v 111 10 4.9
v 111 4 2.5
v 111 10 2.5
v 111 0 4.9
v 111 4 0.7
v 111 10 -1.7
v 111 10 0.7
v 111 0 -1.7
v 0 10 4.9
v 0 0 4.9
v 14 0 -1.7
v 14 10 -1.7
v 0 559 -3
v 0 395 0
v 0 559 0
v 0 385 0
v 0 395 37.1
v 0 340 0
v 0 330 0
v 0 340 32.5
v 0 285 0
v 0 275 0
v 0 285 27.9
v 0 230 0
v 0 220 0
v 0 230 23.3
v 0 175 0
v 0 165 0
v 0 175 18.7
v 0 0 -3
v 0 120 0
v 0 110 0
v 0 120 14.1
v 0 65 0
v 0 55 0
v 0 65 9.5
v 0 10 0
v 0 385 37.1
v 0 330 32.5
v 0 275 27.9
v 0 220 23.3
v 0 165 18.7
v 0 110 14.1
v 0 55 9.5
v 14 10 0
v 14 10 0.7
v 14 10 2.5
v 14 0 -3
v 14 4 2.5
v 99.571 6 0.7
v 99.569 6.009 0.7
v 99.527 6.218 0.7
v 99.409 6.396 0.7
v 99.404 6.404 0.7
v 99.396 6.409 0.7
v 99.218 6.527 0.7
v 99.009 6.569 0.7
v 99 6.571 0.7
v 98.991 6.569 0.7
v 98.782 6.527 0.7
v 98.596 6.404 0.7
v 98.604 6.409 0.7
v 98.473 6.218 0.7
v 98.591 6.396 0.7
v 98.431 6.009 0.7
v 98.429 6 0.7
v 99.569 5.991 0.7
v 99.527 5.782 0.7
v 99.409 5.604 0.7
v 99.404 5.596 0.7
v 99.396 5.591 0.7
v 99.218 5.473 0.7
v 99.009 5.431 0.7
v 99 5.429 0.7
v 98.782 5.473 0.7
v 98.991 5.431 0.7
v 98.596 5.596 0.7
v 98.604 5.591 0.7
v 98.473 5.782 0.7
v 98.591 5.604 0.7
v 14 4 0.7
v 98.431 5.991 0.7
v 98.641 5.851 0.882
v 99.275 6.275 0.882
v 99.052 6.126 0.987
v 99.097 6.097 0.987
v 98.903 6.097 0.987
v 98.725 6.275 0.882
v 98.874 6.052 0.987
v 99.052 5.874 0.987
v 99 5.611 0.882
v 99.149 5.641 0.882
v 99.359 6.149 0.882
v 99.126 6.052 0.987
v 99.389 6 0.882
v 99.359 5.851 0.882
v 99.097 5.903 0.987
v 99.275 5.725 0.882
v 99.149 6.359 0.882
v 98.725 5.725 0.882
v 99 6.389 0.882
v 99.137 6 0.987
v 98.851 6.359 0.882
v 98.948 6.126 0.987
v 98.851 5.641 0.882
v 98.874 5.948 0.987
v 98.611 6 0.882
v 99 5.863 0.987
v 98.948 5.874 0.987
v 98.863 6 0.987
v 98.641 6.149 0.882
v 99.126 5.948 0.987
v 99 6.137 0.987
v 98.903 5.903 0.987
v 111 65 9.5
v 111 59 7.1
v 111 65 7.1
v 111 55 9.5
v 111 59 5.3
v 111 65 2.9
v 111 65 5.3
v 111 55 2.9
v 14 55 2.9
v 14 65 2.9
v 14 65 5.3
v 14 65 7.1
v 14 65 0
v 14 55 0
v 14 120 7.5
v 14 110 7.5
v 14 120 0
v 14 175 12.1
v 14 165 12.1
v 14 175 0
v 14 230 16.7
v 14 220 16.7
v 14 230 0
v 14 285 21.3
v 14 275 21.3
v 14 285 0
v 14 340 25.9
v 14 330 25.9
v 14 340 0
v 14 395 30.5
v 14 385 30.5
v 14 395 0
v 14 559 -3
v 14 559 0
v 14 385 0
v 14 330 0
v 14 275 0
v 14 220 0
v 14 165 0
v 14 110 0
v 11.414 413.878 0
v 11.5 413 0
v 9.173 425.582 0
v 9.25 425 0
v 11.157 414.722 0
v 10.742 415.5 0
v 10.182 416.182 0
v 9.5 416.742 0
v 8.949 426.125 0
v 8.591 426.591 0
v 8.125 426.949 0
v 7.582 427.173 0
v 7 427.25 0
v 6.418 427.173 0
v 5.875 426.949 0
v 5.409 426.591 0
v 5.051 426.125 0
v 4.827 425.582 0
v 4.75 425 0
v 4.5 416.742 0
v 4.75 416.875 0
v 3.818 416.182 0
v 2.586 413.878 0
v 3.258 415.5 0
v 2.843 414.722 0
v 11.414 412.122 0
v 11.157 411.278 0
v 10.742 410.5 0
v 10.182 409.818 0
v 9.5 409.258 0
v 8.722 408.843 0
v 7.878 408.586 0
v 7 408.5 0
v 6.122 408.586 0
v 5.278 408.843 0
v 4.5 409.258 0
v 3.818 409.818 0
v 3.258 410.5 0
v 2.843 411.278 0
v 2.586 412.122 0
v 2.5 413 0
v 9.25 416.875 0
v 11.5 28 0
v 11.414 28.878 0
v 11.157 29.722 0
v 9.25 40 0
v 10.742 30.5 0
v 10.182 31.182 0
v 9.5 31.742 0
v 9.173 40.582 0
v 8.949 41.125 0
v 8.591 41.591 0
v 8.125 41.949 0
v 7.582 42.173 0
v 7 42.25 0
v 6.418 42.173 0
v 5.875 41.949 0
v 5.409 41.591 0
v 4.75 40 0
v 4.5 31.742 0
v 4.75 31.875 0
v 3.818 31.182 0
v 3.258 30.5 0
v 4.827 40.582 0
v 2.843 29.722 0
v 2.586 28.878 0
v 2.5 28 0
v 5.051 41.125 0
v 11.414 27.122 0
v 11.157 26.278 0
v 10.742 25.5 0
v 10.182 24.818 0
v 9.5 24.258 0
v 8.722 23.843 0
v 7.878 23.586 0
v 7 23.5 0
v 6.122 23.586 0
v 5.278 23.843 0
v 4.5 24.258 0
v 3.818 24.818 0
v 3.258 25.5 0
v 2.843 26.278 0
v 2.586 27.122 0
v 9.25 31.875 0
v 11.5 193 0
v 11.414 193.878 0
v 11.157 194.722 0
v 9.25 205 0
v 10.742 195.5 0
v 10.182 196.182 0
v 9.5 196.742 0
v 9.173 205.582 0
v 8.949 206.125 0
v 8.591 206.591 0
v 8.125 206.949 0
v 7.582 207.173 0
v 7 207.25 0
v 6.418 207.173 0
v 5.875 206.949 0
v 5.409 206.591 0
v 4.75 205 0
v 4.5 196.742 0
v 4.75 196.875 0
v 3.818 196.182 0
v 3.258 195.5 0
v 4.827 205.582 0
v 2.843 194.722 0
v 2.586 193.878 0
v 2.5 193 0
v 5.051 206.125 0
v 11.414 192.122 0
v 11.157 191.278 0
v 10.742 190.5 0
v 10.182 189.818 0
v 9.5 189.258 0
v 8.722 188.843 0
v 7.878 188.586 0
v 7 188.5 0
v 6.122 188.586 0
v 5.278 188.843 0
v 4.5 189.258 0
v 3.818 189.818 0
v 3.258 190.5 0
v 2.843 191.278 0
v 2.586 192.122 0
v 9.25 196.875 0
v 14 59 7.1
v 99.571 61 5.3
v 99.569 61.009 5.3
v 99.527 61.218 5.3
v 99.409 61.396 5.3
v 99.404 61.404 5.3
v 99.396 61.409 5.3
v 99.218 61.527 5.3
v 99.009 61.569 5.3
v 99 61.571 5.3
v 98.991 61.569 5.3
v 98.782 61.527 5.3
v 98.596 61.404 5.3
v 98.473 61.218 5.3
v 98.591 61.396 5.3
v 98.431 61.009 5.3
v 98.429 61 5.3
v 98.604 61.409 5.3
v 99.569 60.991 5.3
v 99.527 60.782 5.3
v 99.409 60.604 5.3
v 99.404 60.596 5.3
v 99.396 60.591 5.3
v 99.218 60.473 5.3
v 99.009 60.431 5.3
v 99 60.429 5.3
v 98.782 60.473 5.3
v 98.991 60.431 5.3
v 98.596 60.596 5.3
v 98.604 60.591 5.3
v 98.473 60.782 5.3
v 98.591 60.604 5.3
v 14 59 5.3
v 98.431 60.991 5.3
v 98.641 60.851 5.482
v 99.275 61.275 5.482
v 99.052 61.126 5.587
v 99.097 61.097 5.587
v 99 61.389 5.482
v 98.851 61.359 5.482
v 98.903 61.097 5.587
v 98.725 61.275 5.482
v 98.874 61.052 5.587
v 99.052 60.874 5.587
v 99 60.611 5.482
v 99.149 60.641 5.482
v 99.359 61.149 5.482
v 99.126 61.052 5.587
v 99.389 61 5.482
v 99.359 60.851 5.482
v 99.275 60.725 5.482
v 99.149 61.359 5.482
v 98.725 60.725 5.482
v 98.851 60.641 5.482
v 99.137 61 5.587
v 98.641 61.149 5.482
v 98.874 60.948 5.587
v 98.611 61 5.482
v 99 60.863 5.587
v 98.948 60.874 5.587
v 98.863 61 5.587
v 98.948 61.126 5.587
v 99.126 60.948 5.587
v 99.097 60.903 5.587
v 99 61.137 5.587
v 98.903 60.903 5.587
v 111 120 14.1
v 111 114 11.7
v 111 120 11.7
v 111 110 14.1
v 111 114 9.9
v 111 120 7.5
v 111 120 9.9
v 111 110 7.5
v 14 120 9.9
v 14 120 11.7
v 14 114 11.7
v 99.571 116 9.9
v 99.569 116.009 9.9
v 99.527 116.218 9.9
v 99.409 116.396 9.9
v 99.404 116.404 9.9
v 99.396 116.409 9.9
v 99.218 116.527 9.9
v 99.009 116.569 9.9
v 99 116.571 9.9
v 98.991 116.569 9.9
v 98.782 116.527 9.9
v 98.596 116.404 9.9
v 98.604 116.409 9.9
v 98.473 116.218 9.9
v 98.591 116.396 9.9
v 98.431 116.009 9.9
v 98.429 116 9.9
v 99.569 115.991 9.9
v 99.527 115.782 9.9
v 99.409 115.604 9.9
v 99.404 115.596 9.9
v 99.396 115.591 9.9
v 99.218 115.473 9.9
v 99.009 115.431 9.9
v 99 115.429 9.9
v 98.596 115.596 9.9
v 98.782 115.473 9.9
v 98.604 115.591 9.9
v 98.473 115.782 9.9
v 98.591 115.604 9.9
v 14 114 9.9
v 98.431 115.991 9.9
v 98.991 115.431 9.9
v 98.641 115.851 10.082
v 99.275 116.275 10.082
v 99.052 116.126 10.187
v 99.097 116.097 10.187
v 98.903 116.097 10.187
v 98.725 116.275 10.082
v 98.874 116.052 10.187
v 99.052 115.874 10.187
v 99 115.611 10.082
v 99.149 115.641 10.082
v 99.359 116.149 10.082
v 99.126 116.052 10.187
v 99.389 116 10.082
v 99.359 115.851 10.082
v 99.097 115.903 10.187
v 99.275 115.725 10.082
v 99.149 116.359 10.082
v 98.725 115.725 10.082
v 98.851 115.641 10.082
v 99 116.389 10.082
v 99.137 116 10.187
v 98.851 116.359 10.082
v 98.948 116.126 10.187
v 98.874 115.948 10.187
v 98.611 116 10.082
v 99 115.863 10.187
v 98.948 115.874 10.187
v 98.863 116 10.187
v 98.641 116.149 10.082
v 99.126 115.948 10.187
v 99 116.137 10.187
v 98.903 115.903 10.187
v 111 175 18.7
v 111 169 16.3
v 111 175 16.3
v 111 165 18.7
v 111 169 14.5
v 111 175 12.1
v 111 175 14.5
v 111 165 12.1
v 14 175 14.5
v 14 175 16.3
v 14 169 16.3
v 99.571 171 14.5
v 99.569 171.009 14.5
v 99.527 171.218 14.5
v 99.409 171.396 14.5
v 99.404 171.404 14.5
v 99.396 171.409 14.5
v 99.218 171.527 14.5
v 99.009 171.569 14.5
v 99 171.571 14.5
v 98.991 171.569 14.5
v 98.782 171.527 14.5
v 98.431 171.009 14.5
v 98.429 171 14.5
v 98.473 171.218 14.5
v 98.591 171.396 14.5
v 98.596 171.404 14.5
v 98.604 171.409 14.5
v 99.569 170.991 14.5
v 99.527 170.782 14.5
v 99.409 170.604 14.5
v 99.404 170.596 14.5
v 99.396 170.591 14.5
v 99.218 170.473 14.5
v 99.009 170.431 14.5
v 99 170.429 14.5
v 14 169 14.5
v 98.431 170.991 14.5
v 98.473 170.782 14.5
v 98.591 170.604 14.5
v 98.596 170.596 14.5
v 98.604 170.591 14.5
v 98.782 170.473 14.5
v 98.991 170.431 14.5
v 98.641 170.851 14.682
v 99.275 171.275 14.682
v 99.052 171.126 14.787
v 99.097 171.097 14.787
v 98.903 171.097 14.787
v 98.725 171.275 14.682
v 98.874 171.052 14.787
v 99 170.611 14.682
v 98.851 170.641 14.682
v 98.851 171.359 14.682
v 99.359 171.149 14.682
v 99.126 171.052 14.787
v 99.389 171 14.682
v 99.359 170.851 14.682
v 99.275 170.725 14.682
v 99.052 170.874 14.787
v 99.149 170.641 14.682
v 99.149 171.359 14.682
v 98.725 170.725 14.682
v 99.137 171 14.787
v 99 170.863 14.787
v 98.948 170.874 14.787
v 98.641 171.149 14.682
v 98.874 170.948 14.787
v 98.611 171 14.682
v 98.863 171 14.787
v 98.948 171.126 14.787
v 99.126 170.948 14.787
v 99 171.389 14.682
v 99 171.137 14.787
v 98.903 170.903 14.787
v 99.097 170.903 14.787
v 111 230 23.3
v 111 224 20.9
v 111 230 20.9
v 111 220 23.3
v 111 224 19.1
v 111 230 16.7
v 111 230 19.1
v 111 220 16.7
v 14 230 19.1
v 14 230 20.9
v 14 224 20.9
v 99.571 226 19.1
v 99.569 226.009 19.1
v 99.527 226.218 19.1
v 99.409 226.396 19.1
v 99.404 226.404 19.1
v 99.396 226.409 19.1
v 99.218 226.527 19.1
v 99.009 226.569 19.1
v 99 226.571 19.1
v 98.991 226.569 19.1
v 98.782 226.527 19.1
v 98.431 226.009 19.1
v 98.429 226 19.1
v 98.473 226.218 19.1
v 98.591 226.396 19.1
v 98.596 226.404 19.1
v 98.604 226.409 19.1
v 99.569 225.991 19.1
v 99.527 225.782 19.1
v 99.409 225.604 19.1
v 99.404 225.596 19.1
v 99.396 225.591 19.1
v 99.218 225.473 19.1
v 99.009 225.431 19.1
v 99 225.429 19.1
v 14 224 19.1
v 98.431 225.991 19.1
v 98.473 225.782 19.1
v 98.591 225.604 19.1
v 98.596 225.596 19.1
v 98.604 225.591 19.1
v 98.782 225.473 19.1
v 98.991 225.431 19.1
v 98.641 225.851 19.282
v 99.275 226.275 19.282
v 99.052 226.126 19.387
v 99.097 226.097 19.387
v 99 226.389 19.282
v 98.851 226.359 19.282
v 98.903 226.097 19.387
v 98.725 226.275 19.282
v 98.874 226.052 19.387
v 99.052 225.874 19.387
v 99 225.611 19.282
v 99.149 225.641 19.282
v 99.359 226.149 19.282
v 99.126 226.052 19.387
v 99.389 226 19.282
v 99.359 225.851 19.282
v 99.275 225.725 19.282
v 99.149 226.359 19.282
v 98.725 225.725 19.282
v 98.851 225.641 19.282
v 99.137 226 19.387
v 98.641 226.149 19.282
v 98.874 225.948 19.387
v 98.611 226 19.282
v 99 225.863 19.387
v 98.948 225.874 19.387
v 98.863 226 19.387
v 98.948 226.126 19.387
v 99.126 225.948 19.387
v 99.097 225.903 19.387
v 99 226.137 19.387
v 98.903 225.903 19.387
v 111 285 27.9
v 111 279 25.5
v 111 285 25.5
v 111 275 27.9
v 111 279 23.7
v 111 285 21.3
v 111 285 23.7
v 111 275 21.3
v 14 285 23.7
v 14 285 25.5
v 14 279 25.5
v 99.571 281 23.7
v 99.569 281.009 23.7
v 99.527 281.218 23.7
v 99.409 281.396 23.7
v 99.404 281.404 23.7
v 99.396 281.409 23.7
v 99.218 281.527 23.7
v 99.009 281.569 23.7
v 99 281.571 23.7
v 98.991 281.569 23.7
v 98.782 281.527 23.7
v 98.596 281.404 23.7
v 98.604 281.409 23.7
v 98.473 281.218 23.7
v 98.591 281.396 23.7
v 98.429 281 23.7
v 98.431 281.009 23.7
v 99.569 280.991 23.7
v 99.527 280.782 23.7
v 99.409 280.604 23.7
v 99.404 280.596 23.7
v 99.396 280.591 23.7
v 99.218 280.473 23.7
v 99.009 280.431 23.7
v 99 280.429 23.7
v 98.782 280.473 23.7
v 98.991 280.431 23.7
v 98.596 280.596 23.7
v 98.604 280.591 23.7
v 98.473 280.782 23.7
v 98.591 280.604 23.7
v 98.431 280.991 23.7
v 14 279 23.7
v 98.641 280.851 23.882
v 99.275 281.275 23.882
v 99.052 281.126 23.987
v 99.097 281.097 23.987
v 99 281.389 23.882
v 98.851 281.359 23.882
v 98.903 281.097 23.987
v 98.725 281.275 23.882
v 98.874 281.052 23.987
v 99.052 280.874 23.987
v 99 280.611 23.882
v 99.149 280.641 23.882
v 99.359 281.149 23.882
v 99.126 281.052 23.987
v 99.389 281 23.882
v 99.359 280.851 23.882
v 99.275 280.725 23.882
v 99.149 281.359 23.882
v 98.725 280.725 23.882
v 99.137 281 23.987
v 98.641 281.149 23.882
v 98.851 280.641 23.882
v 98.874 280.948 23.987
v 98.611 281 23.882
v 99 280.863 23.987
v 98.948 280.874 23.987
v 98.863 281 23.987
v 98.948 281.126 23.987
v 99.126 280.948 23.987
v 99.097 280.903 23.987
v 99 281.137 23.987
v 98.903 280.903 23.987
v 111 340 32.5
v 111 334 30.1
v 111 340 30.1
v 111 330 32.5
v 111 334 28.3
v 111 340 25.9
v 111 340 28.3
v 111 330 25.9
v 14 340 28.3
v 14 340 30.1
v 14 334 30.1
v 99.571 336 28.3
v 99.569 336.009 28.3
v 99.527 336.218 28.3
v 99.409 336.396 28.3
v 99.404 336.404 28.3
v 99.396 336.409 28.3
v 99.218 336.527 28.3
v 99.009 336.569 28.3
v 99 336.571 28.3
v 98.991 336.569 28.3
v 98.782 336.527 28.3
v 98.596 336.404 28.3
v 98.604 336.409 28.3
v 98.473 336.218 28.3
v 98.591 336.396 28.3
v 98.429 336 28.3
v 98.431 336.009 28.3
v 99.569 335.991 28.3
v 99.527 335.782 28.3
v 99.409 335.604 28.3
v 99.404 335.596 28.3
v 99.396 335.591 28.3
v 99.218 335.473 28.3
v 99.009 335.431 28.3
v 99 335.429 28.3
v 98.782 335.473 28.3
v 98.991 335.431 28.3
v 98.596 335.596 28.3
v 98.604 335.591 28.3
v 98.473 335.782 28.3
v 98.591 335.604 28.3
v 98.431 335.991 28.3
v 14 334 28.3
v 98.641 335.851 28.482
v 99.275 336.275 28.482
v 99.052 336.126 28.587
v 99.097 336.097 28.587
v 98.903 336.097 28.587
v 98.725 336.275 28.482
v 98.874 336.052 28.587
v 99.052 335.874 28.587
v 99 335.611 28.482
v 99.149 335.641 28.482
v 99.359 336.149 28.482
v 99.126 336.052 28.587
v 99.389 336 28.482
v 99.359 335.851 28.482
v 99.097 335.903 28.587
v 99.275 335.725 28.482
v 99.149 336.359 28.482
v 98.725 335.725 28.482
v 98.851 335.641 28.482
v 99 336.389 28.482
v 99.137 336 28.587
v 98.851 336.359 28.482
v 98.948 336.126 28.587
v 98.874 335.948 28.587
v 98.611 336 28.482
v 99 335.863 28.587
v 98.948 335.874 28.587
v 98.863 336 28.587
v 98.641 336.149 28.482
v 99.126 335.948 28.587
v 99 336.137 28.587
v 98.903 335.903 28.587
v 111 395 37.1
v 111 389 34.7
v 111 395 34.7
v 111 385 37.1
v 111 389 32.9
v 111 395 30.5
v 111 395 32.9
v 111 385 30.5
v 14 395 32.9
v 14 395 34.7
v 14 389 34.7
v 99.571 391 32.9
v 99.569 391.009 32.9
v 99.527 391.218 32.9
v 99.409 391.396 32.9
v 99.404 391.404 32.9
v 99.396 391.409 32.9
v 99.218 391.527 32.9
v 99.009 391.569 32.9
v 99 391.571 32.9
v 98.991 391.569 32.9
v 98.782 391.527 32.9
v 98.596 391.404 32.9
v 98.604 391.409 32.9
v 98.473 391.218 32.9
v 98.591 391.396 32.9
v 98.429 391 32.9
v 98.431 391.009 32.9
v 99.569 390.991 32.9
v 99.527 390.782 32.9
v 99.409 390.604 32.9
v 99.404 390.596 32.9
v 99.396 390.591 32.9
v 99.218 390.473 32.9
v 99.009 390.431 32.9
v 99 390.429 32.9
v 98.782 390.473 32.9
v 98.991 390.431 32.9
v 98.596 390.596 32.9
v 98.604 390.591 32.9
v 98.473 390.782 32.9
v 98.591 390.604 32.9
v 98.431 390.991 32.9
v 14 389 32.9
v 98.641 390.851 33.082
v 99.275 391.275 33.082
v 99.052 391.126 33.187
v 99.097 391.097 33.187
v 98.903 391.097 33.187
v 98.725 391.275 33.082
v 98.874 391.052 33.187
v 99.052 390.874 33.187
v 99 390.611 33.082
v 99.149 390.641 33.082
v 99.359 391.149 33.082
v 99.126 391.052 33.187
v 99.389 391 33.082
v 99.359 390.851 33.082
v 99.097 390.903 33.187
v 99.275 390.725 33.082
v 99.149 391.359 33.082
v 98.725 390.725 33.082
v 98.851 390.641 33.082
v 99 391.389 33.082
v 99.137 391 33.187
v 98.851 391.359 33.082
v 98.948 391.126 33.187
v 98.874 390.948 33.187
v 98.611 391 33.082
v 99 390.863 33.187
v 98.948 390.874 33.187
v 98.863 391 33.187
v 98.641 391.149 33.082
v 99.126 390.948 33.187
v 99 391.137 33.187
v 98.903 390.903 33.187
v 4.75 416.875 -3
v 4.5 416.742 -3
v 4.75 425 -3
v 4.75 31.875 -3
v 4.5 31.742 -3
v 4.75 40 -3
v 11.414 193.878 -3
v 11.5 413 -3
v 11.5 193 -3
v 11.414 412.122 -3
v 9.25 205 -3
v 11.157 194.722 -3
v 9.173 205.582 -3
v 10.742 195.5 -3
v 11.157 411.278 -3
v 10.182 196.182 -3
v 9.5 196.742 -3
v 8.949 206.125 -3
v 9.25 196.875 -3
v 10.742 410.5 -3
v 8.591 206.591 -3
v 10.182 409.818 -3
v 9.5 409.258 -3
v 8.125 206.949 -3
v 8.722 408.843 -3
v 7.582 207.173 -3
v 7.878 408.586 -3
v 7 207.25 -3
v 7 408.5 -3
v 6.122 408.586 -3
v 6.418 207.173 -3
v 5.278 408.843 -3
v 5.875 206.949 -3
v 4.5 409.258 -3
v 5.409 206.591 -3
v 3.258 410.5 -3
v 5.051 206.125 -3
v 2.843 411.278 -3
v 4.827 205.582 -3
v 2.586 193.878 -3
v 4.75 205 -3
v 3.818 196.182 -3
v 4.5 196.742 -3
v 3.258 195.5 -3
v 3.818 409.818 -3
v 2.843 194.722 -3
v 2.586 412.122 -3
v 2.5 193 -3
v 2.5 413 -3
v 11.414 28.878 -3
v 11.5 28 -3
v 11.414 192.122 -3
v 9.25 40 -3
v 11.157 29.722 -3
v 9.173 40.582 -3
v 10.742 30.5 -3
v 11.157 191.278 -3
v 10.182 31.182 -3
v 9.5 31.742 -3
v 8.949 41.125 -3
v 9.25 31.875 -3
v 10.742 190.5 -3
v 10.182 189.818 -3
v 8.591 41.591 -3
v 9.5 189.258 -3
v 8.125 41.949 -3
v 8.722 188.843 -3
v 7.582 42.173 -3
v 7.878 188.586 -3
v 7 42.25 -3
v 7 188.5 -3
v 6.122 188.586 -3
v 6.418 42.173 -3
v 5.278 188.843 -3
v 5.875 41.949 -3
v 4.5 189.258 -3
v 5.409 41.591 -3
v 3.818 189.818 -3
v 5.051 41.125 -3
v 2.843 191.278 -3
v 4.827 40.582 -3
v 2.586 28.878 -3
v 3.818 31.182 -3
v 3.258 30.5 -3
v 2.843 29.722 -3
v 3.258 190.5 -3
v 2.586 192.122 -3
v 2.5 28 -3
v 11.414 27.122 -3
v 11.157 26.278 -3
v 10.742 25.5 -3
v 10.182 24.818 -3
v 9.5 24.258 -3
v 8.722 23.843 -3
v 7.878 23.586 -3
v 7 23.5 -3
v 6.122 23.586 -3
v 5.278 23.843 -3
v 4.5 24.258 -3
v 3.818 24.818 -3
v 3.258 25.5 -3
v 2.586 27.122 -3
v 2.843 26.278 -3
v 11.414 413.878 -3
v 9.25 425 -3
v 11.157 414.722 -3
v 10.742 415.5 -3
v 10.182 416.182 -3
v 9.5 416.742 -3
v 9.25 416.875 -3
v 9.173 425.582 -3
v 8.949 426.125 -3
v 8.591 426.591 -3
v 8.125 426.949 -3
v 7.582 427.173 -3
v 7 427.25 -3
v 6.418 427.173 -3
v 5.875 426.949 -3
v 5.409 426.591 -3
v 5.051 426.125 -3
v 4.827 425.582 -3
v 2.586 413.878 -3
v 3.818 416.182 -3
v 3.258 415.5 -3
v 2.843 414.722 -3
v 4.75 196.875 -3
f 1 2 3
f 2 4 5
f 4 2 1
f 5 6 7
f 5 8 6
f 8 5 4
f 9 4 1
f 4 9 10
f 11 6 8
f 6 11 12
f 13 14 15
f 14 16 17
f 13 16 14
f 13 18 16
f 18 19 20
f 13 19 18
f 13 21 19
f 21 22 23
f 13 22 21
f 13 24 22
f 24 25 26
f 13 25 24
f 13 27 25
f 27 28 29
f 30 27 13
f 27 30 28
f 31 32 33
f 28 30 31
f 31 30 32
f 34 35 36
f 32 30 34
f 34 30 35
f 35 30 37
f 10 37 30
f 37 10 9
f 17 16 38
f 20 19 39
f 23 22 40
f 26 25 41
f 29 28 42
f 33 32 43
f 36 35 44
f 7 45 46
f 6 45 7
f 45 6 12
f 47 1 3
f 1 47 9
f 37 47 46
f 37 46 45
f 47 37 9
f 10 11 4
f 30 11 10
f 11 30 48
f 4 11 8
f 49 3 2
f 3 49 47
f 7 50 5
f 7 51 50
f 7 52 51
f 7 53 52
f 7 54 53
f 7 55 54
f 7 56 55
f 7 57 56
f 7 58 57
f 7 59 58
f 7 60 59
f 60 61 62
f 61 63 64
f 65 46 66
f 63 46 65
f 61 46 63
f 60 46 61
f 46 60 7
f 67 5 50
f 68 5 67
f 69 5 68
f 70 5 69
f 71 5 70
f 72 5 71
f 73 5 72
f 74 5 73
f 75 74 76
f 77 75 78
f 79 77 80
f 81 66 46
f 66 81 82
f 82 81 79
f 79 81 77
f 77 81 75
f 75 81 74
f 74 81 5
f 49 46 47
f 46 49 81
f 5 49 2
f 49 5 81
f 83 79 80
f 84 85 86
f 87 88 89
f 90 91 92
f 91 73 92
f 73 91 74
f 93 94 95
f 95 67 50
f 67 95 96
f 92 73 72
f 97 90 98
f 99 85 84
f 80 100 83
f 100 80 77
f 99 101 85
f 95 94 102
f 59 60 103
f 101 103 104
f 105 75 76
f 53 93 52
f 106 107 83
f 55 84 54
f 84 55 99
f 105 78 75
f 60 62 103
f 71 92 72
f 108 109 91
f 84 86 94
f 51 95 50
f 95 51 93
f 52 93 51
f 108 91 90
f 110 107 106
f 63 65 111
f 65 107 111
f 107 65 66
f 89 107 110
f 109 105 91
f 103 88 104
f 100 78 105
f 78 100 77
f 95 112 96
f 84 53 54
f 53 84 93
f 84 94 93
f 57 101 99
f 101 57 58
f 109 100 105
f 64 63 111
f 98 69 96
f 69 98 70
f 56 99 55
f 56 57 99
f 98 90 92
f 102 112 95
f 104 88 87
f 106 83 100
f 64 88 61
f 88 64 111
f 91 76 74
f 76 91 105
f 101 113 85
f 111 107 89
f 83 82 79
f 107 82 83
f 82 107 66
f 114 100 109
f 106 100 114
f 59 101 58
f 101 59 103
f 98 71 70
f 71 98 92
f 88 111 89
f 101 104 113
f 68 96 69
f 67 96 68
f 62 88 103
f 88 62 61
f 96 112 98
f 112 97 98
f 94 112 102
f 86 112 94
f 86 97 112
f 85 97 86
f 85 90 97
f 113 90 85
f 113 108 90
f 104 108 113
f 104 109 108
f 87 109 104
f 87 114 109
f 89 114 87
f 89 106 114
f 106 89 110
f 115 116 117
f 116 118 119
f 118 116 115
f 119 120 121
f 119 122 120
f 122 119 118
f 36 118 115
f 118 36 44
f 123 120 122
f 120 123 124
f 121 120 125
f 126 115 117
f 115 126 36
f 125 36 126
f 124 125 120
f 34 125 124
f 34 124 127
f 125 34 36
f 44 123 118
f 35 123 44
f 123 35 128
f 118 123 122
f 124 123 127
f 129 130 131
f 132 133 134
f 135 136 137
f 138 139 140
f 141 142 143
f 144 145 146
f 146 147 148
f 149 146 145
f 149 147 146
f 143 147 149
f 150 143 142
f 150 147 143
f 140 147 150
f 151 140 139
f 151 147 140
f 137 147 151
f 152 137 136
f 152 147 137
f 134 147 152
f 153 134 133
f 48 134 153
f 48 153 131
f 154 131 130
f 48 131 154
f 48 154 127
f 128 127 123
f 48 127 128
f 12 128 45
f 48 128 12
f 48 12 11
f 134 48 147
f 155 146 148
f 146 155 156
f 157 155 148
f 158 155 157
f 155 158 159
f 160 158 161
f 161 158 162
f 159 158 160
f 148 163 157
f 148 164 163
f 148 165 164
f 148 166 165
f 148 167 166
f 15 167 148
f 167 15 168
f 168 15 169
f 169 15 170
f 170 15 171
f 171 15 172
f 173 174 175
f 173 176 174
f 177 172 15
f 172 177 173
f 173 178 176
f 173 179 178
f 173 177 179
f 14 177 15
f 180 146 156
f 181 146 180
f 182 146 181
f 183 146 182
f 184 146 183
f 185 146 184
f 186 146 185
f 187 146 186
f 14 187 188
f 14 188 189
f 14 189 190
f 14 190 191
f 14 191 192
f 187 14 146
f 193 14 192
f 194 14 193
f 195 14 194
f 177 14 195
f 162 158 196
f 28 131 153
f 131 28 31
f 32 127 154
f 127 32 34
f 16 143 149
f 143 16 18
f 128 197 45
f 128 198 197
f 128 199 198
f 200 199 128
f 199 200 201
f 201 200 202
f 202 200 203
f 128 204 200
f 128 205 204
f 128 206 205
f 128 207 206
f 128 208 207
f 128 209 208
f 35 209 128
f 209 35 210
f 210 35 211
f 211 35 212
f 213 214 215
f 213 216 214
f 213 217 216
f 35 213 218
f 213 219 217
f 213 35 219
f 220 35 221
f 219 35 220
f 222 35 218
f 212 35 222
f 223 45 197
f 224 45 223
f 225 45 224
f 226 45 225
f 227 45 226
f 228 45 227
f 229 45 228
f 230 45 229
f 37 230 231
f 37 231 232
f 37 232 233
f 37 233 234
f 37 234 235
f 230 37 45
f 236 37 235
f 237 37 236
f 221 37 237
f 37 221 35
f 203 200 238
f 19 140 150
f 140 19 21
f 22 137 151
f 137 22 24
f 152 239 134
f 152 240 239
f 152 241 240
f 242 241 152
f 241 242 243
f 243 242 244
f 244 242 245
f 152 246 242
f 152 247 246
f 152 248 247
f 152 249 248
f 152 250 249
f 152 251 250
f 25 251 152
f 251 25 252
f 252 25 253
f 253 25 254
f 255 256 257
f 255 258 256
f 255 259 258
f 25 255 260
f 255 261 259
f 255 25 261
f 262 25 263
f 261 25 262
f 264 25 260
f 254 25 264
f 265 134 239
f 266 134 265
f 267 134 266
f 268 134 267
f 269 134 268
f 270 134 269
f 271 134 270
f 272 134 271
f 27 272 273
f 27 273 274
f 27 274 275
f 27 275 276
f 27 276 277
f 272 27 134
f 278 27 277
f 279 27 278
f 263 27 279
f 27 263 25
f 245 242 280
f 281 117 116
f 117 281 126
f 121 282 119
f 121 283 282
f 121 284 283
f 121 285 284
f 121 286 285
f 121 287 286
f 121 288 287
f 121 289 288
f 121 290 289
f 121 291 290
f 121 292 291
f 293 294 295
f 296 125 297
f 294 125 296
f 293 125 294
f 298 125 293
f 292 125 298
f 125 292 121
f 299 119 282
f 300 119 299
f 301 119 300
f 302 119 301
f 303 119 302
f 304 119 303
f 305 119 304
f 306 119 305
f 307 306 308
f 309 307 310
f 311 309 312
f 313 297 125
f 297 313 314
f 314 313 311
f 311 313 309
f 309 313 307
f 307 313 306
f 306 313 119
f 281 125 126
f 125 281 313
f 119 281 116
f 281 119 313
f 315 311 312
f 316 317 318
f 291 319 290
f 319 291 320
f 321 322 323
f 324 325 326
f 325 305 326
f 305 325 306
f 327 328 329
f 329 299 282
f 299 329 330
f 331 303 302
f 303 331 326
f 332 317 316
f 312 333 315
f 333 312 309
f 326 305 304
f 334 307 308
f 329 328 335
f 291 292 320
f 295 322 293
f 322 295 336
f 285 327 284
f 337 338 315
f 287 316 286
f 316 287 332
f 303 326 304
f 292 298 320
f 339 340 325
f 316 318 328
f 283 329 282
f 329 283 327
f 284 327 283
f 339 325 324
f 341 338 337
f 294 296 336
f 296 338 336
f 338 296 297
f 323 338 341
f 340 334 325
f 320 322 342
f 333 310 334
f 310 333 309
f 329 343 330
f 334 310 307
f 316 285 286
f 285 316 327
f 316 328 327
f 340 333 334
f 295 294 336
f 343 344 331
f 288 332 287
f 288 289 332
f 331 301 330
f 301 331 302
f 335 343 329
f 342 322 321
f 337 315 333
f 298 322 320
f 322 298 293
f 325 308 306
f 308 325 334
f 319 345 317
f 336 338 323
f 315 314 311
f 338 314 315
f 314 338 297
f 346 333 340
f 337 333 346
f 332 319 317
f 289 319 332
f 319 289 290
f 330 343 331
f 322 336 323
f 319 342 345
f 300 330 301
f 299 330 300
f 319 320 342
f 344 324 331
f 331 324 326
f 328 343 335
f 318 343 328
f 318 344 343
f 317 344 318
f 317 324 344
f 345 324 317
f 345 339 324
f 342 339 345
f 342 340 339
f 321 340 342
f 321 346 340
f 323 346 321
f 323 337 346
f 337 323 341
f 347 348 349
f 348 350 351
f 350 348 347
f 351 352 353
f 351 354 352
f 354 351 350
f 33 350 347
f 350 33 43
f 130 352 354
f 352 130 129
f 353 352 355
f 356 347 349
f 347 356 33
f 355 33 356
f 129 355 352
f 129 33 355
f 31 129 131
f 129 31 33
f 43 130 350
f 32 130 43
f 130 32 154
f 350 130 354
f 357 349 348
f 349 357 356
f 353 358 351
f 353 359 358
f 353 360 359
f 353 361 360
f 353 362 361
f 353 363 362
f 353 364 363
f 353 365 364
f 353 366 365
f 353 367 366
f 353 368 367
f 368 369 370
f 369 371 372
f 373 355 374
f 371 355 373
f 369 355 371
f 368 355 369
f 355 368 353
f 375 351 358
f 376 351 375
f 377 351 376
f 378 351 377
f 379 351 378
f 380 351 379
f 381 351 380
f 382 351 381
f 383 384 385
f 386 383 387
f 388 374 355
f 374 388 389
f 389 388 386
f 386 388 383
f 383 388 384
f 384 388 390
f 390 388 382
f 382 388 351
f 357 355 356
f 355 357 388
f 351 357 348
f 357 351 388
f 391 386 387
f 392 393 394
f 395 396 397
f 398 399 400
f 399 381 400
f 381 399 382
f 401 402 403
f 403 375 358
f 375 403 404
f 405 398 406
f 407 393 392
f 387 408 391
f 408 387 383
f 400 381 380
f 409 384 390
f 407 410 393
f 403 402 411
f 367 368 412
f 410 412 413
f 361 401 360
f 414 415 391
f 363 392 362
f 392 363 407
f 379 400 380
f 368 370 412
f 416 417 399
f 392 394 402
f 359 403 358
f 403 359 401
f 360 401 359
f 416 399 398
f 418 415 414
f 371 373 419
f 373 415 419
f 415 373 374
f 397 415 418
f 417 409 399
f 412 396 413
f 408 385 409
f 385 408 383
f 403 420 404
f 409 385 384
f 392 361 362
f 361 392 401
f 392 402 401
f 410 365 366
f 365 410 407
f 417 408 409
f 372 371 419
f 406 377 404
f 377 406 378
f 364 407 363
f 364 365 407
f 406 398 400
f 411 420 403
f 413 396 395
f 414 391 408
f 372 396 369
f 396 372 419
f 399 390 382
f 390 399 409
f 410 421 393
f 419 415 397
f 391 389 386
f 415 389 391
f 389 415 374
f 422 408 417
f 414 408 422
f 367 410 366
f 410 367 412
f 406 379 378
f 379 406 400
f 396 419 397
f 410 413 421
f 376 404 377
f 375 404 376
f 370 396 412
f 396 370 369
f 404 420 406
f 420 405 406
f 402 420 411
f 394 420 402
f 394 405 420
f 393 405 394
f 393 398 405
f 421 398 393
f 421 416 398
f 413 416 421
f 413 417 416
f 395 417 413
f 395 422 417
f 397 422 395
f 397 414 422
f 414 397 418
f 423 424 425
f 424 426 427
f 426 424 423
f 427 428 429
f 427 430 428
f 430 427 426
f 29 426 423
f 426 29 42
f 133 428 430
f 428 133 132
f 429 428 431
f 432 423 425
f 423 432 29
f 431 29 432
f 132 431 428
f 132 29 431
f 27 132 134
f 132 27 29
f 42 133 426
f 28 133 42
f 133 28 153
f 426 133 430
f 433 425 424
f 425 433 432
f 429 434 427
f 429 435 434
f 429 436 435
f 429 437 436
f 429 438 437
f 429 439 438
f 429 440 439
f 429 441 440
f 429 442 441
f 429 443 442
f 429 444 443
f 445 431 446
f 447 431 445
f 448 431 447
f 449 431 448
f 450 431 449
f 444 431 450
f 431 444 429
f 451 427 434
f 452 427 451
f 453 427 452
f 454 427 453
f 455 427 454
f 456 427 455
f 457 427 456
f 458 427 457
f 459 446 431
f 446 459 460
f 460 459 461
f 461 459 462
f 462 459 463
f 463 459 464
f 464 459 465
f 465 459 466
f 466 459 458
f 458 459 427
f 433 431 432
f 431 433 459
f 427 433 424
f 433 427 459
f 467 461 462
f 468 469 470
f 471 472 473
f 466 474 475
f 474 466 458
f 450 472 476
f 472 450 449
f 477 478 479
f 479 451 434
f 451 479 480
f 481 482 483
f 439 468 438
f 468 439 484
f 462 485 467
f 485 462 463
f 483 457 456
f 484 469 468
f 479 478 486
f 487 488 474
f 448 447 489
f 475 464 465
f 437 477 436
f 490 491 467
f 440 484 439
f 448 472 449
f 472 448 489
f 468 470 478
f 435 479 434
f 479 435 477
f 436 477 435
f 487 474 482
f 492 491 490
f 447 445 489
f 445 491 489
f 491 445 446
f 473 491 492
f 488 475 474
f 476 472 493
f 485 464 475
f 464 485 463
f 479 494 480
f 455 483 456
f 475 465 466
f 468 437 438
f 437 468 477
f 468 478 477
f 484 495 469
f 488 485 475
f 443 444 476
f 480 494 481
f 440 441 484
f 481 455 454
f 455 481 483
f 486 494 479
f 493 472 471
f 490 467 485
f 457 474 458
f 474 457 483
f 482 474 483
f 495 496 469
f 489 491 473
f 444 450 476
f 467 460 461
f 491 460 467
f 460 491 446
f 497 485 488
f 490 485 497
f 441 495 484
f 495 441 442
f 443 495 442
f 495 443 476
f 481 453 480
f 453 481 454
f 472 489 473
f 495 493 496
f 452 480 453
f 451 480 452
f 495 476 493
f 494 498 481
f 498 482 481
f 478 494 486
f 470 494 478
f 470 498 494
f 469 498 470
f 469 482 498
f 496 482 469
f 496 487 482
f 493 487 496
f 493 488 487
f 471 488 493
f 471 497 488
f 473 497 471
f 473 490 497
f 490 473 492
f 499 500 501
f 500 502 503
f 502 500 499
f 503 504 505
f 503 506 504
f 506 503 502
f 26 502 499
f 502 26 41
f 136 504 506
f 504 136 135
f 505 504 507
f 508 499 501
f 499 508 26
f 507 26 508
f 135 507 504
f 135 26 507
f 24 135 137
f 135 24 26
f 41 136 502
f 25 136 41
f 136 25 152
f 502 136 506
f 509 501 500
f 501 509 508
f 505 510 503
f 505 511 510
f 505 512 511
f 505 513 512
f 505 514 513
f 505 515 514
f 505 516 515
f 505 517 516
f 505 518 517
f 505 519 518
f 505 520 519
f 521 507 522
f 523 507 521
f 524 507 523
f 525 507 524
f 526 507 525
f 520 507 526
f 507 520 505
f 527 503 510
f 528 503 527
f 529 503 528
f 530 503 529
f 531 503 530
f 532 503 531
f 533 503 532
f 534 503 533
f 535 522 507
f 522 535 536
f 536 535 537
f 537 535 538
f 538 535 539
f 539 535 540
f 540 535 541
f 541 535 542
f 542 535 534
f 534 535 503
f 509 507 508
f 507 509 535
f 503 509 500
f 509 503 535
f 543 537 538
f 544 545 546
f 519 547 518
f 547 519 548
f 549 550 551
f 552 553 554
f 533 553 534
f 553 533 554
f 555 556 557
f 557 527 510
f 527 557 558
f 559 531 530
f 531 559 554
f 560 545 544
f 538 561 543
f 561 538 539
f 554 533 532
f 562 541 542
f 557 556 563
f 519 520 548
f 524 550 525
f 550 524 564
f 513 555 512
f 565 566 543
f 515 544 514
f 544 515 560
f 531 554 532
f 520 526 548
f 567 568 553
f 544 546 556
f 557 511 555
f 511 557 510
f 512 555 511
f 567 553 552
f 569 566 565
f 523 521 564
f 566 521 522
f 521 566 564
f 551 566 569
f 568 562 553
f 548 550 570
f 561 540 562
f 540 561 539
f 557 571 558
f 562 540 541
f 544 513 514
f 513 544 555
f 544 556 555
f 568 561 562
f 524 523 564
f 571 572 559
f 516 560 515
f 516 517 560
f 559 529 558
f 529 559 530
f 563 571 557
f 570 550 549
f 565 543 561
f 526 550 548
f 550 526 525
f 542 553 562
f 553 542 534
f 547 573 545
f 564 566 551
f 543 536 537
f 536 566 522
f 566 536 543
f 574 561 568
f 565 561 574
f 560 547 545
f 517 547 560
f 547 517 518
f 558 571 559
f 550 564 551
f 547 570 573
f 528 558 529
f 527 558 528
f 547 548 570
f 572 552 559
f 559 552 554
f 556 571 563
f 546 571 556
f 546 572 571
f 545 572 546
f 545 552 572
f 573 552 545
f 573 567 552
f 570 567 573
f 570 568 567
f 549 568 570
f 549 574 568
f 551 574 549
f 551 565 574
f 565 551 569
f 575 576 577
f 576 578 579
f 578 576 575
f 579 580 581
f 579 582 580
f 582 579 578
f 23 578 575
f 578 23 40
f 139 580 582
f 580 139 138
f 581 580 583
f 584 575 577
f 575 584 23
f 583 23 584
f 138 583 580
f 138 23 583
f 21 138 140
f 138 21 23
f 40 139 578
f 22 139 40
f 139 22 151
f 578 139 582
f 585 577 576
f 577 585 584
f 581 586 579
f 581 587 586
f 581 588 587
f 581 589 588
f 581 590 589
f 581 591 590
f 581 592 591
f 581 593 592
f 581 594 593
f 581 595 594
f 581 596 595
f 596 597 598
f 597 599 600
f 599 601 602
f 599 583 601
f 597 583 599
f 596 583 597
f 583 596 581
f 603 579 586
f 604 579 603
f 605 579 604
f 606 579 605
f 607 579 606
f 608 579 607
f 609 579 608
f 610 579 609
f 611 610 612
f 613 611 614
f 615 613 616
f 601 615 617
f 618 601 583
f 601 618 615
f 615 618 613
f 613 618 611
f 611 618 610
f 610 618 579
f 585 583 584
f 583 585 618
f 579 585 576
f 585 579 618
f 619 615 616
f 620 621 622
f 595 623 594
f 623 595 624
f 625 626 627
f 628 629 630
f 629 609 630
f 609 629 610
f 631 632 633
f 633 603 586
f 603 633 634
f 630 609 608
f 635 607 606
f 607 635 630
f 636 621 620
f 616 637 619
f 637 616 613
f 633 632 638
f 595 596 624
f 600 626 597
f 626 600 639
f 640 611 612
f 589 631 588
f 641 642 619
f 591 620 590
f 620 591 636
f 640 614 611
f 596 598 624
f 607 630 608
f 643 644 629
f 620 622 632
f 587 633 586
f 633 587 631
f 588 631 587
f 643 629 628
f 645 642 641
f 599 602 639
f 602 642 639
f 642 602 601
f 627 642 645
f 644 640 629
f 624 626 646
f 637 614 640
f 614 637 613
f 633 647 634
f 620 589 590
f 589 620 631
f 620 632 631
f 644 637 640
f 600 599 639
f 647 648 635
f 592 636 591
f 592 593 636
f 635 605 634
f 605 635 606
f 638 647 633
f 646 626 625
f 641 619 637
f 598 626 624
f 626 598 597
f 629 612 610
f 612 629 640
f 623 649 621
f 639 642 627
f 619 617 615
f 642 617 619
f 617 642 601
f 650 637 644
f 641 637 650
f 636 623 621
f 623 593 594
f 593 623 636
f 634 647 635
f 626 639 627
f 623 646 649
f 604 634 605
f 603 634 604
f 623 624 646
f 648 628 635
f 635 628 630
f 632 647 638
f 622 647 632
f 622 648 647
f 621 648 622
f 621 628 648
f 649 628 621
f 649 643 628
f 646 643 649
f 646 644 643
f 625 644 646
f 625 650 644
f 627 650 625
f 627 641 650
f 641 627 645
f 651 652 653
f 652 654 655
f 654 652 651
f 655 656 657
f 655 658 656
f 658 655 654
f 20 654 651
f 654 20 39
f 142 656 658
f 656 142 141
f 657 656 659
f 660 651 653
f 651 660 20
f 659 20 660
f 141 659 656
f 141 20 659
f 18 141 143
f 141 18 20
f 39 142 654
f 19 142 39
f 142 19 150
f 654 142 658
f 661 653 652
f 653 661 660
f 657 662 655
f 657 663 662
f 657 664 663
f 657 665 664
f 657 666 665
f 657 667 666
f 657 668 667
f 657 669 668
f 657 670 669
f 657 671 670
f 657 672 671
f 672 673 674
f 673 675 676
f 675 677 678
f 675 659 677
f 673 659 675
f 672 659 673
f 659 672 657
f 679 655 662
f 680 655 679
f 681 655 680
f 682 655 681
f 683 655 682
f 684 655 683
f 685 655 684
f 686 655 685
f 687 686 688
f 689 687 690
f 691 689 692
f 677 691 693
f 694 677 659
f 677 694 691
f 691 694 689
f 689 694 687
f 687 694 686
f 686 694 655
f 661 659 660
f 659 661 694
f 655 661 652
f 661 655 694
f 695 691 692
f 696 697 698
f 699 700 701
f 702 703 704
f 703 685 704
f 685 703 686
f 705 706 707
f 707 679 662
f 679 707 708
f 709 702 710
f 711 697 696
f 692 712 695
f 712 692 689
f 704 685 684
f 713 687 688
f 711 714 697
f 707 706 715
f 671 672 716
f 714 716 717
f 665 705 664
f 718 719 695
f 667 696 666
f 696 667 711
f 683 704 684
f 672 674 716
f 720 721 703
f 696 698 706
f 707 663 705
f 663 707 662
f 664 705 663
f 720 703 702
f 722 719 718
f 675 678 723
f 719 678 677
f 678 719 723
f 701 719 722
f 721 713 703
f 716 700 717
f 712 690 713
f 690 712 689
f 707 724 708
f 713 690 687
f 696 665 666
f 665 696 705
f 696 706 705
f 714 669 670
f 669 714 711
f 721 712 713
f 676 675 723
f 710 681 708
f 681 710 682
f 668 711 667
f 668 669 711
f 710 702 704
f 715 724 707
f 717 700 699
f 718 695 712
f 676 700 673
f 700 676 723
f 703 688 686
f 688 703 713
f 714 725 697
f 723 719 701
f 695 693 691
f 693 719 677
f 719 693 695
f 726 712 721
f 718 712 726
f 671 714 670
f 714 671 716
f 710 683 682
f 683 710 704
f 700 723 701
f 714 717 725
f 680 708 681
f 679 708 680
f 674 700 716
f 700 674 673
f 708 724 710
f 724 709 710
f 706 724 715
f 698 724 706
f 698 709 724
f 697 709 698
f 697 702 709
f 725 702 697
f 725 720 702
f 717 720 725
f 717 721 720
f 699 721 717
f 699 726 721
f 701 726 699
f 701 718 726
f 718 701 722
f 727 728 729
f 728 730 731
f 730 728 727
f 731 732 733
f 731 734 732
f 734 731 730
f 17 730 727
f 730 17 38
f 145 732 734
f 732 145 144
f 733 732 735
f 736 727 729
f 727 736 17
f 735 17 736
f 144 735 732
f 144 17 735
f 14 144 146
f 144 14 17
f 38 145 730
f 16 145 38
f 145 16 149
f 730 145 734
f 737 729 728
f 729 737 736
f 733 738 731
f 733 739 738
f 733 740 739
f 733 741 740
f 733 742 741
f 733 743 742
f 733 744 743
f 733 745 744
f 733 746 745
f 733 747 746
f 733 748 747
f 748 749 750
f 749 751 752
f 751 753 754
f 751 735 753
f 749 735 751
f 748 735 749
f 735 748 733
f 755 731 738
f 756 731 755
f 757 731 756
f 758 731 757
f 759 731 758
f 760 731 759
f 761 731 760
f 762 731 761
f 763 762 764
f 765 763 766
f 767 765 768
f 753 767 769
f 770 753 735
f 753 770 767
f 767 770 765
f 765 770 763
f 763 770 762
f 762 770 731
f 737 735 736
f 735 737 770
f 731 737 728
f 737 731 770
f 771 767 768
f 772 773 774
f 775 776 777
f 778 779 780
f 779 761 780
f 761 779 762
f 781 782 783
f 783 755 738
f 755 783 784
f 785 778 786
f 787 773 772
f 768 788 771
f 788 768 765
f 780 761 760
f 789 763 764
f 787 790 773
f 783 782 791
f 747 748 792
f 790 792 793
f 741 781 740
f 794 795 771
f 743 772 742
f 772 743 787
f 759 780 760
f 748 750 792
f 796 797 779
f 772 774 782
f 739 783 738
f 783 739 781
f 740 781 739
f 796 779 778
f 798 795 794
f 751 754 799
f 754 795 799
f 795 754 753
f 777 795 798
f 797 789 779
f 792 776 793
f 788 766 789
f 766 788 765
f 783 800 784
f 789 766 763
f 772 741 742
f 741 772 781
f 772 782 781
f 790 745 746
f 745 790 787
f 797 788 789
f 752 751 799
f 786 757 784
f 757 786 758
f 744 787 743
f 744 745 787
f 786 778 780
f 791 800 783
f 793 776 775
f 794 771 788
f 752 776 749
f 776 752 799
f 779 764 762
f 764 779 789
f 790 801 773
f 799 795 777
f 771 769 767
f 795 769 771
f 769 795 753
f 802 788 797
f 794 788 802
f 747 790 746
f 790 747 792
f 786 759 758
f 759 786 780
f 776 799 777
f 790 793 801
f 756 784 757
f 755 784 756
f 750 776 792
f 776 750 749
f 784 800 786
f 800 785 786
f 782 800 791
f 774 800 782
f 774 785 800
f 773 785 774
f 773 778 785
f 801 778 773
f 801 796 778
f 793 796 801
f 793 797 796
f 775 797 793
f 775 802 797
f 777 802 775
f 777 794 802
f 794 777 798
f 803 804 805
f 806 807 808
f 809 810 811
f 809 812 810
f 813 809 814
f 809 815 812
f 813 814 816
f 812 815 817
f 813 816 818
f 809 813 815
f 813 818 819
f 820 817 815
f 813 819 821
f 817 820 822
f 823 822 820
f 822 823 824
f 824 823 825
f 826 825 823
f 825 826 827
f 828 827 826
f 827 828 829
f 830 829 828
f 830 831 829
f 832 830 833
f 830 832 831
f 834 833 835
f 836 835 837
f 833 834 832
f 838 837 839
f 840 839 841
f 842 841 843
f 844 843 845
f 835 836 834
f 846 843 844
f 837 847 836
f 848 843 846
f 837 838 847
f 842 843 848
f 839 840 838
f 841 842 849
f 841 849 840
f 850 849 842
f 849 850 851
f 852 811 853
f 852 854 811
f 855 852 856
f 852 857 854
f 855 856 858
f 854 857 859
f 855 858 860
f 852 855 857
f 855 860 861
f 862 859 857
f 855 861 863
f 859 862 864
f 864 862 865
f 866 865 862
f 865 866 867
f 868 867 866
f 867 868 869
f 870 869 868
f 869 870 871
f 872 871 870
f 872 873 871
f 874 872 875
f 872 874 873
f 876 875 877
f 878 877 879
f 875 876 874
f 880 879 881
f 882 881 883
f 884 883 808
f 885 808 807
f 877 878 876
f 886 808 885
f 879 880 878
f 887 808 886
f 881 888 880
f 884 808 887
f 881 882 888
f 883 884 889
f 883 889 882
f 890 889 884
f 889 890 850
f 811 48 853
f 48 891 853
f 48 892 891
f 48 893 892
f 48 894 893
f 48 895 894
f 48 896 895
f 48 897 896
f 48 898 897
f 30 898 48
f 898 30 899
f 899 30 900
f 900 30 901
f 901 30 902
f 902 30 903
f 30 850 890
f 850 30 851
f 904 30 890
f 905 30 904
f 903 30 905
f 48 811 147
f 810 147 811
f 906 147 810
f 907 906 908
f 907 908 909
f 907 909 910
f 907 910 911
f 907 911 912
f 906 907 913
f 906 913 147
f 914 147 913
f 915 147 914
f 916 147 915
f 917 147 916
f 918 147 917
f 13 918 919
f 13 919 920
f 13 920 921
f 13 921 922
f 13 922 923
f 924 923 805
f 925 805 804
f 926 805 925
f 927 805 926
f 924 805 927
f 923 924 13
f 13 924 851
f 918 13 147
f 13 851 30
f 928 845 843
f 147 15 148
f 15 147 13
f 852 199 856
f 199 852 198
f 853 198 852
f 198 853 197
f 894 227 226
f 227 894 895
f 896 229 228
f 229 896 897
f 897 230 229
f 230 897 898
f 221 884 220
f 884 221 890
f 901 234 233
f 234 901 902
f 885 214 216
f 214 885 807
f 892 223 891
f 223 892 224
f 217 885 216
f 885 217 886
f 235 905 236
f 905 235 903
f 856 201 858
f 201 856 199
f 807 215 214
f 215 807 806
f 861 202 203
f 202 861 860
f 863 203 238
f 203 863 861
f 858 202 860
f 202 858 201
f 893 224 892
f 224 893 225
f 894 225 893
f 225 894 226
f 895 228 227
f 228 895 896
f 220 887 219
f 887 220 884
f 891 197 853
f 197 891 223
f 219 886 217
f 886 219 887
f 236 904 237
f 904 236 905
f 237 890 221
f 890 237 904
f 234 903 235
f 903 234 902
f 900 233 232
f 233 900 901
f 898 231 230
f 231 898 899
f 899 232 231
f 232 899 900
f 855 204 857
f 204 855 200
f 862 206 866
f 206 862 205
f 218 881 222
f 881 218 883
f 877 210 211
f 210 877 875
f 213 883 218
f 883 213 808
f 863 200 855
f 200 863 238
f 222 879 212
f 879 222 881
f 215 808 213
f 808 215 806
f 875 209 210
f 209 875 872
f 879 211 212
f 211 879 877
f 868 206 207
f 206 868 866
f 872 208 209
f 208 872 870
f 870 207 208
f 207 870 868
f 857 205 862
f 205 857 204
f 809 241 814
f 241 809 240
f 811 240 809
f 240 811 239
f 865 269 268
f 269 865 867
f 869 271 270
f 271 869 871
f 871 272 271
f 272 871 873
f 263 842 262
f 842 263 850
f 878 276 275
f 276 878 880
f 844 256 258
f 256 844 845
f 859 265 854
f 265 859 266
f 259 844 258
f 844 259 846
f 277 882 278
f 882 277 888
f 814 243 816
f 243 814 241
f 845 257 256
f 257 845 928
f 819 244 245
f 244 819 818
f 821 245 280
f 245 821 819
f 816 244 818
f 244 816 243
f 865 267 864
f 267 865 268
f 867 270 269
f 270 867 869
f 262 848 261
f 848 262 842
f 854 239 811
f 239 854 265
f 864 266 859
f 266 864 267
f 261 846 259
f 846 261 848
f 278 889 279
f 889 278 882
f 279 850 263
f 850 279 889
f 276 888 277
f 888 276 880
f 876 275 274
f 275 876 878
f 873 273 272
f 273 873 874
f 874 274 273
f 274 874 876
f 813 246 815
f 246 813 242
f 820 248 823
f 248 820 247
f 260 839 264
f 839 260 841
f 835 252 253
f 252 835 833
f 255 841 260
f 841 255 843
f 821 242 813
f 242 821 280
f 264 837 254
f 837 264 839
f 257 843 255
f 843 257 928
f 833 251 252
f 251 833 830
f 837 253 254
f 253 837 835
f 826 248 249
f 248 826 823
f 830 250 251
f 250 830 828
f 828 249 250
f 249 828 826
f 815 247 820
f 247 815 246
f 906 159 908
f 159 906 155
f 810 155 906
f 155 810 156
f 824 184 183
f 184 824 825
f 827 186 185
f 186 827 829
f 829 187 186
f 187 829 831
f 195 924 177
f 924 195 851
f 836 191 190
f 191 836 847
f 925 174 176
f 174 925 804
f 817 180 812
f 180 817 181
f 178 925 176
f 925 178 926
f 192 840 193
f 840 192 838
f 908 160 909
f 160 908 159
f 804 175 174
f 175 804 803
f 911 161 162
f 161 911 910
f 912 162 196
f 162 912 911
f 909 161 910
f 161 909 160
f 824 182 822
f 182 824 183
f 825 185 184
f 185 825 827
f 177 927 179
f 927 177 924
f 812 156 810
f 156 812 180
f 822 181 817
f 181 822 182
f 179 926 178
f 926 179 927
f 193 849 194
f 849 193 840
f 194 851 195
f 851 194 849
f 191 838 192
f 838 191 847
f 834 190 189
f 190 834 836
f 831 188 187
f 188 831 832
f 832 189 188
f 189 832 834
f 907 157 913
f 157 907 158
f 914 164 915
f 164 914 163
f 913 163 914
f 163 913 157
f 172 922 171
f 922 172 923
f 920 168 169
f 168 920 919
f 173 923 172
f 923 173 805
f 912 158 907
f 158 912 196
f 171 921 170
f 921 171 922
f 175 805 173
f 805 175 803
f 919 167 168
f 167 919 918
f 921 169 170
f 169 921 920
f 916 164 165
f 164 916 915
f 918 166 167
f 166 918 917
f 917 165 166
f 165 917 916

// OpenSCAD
// Side-Slide Shingle Rack - parametric wall display for carded die-cast cars.
// Units: mm. x = left->right, y = up, z = out from the wall.
//
// Every card stands in its own depth plane (shingled, 'step' apart) and is held
// only by a gutter in its own ledge. Nothing is in front of the cards, and each
// card slides out to the right without touching any other card.
//
// NOTE: not test-rendered in this environment (no OpenSCAD available) - open it
// in OpenSCAD, press F6, and check the echoed numbers before printing.
// MEASURE YOUR CARDS with calipers and edit the first block.

// ---- card (measure these) ----
card_w      = 105;   // card width
card_h      = 165;   // card height
card_t      = 1.2;   // card thickness (cardstock only, excluding blister)
blister_h   = 42;    // height of the car blister measured from card bottom edge
                     // (must fit in the visible window, see assert below)

// ---- layout ----
N           = 8;     // number of cards
pitch       = 55;    // vertical spacing = visible strip per card
step        = 4.6;   // depth spacing between neighbouring cards

// ---- structure ----
back_t      = 3;     // wall plate thickness
spine_w     = 14;    // left spine / end stop width
ledge_h     = 10;    // ledge height (y)
gutter_d    = 6;     // how deep the card bottom sits in the gutter
slop        = 0.3;   // clearance each side of the card in the gutter
rear_wall   = 2.4;   // ledge wall behind the gutter
front_wall  = 2.4;   // ledge wall in front of the gutter
thumb_out   = 8;     // card overhangs the ledge's right end by this much

gw          = card_t + 2*slop;              // gutter width
ledge_w     = spine_w + card_w - thumb_out; // ledge length (x)
H           = (N-1)*pitch + ledge_h - gutter_d + card_h + 5;  // plate height

// z of the rear face of card j (j = 0 is the bottom, rearmost card)
function zc(j) = 1 + j*step;

// ---- sanity checks ----
// ledge j must clear the card behind it (card j-1 passes behind ledge j)
assert(step >= rear_wall + slop + card_t + 0.4, "step too small: ledge rear wall hits the card behind it");
// the blister of card j must fit under ledge j+1
assert(ledge_h - gutter_d + blister_h <= pitch, "blister too tall: it would hit the ledge above; increase pitch");
echo(str("Rack: ", spine_w+card_w, " x ", H, " x ", zc(N-1)+gw+front_wall+back_t, " mm"));

module ledge(j) {
    z0 = zc(j) - slop - rear_wall;           // rear face of the ledge
    z1 = zc(j) + card_t + slop + front_wall; // front face of the ledge
    y0 = j*pitch;
    difference() {
        union() {
            // ledge beam
            translate([0, y0, z0]) cube([ledge_w, ledge_h, z1 - z0]);
            // bridge from ledge back to the wall plate (spine only)
            translate([0, y0, 0]) cube([spine_w, ledge_h, z1]);
        }
        // gutter open to the right, closed by the spine on the left
        translate([spine_w, y0 + ledge_h - gutter_d, zc(j) - slop])
            cube([ledge_w, gutter_d + 1, gw]);
    }
    // tiny detent bump so cards don't creep out
    translate([spine_w + card_w - thumb_out - 12, y0 + ledge_h - gutter_d + 2, zc(j) - slop - 0.4])
        sphere(r = 0.7, $fn = 16);
}

module keyhole(y) {
    translate([spine_w/2, y, -back_t - 1]) {
        cylinder(d = 9,   h = back_t + 2, $fn = 32);
        translate([0, 0, 0]) hull() {
            cylinder(d = 4.5, h = back_t + 2, $fn = 24);
            translate([0, 12, 0]) cylinder(d = 4.5, h = back_t + 2, $fn = 24);
        }
    }
}

module rack() {
    difference() {
        union() {
            translate([0, 0, -back_t]) cube([spine_w, H, back_t]);   // wall plate
            for (j = [0 : N-1]) ledge(j);
        }
        keyhole(ledge_h + 18);
        keyhole((N/2 - 1)*pitch + ledge_h + 18);
        keyhole((N-1)*pitch + ledge_h + 18);
    }
}

rack();

// Preview-only ghost cards (comment out before export). Uncomment to check fit.
// %for (j = [0 : N-1]) translate([spine_w, j*pitch + ledge_h - gutter_d, zc(j)])
//     cube([card_w, card_h, card_t]);
